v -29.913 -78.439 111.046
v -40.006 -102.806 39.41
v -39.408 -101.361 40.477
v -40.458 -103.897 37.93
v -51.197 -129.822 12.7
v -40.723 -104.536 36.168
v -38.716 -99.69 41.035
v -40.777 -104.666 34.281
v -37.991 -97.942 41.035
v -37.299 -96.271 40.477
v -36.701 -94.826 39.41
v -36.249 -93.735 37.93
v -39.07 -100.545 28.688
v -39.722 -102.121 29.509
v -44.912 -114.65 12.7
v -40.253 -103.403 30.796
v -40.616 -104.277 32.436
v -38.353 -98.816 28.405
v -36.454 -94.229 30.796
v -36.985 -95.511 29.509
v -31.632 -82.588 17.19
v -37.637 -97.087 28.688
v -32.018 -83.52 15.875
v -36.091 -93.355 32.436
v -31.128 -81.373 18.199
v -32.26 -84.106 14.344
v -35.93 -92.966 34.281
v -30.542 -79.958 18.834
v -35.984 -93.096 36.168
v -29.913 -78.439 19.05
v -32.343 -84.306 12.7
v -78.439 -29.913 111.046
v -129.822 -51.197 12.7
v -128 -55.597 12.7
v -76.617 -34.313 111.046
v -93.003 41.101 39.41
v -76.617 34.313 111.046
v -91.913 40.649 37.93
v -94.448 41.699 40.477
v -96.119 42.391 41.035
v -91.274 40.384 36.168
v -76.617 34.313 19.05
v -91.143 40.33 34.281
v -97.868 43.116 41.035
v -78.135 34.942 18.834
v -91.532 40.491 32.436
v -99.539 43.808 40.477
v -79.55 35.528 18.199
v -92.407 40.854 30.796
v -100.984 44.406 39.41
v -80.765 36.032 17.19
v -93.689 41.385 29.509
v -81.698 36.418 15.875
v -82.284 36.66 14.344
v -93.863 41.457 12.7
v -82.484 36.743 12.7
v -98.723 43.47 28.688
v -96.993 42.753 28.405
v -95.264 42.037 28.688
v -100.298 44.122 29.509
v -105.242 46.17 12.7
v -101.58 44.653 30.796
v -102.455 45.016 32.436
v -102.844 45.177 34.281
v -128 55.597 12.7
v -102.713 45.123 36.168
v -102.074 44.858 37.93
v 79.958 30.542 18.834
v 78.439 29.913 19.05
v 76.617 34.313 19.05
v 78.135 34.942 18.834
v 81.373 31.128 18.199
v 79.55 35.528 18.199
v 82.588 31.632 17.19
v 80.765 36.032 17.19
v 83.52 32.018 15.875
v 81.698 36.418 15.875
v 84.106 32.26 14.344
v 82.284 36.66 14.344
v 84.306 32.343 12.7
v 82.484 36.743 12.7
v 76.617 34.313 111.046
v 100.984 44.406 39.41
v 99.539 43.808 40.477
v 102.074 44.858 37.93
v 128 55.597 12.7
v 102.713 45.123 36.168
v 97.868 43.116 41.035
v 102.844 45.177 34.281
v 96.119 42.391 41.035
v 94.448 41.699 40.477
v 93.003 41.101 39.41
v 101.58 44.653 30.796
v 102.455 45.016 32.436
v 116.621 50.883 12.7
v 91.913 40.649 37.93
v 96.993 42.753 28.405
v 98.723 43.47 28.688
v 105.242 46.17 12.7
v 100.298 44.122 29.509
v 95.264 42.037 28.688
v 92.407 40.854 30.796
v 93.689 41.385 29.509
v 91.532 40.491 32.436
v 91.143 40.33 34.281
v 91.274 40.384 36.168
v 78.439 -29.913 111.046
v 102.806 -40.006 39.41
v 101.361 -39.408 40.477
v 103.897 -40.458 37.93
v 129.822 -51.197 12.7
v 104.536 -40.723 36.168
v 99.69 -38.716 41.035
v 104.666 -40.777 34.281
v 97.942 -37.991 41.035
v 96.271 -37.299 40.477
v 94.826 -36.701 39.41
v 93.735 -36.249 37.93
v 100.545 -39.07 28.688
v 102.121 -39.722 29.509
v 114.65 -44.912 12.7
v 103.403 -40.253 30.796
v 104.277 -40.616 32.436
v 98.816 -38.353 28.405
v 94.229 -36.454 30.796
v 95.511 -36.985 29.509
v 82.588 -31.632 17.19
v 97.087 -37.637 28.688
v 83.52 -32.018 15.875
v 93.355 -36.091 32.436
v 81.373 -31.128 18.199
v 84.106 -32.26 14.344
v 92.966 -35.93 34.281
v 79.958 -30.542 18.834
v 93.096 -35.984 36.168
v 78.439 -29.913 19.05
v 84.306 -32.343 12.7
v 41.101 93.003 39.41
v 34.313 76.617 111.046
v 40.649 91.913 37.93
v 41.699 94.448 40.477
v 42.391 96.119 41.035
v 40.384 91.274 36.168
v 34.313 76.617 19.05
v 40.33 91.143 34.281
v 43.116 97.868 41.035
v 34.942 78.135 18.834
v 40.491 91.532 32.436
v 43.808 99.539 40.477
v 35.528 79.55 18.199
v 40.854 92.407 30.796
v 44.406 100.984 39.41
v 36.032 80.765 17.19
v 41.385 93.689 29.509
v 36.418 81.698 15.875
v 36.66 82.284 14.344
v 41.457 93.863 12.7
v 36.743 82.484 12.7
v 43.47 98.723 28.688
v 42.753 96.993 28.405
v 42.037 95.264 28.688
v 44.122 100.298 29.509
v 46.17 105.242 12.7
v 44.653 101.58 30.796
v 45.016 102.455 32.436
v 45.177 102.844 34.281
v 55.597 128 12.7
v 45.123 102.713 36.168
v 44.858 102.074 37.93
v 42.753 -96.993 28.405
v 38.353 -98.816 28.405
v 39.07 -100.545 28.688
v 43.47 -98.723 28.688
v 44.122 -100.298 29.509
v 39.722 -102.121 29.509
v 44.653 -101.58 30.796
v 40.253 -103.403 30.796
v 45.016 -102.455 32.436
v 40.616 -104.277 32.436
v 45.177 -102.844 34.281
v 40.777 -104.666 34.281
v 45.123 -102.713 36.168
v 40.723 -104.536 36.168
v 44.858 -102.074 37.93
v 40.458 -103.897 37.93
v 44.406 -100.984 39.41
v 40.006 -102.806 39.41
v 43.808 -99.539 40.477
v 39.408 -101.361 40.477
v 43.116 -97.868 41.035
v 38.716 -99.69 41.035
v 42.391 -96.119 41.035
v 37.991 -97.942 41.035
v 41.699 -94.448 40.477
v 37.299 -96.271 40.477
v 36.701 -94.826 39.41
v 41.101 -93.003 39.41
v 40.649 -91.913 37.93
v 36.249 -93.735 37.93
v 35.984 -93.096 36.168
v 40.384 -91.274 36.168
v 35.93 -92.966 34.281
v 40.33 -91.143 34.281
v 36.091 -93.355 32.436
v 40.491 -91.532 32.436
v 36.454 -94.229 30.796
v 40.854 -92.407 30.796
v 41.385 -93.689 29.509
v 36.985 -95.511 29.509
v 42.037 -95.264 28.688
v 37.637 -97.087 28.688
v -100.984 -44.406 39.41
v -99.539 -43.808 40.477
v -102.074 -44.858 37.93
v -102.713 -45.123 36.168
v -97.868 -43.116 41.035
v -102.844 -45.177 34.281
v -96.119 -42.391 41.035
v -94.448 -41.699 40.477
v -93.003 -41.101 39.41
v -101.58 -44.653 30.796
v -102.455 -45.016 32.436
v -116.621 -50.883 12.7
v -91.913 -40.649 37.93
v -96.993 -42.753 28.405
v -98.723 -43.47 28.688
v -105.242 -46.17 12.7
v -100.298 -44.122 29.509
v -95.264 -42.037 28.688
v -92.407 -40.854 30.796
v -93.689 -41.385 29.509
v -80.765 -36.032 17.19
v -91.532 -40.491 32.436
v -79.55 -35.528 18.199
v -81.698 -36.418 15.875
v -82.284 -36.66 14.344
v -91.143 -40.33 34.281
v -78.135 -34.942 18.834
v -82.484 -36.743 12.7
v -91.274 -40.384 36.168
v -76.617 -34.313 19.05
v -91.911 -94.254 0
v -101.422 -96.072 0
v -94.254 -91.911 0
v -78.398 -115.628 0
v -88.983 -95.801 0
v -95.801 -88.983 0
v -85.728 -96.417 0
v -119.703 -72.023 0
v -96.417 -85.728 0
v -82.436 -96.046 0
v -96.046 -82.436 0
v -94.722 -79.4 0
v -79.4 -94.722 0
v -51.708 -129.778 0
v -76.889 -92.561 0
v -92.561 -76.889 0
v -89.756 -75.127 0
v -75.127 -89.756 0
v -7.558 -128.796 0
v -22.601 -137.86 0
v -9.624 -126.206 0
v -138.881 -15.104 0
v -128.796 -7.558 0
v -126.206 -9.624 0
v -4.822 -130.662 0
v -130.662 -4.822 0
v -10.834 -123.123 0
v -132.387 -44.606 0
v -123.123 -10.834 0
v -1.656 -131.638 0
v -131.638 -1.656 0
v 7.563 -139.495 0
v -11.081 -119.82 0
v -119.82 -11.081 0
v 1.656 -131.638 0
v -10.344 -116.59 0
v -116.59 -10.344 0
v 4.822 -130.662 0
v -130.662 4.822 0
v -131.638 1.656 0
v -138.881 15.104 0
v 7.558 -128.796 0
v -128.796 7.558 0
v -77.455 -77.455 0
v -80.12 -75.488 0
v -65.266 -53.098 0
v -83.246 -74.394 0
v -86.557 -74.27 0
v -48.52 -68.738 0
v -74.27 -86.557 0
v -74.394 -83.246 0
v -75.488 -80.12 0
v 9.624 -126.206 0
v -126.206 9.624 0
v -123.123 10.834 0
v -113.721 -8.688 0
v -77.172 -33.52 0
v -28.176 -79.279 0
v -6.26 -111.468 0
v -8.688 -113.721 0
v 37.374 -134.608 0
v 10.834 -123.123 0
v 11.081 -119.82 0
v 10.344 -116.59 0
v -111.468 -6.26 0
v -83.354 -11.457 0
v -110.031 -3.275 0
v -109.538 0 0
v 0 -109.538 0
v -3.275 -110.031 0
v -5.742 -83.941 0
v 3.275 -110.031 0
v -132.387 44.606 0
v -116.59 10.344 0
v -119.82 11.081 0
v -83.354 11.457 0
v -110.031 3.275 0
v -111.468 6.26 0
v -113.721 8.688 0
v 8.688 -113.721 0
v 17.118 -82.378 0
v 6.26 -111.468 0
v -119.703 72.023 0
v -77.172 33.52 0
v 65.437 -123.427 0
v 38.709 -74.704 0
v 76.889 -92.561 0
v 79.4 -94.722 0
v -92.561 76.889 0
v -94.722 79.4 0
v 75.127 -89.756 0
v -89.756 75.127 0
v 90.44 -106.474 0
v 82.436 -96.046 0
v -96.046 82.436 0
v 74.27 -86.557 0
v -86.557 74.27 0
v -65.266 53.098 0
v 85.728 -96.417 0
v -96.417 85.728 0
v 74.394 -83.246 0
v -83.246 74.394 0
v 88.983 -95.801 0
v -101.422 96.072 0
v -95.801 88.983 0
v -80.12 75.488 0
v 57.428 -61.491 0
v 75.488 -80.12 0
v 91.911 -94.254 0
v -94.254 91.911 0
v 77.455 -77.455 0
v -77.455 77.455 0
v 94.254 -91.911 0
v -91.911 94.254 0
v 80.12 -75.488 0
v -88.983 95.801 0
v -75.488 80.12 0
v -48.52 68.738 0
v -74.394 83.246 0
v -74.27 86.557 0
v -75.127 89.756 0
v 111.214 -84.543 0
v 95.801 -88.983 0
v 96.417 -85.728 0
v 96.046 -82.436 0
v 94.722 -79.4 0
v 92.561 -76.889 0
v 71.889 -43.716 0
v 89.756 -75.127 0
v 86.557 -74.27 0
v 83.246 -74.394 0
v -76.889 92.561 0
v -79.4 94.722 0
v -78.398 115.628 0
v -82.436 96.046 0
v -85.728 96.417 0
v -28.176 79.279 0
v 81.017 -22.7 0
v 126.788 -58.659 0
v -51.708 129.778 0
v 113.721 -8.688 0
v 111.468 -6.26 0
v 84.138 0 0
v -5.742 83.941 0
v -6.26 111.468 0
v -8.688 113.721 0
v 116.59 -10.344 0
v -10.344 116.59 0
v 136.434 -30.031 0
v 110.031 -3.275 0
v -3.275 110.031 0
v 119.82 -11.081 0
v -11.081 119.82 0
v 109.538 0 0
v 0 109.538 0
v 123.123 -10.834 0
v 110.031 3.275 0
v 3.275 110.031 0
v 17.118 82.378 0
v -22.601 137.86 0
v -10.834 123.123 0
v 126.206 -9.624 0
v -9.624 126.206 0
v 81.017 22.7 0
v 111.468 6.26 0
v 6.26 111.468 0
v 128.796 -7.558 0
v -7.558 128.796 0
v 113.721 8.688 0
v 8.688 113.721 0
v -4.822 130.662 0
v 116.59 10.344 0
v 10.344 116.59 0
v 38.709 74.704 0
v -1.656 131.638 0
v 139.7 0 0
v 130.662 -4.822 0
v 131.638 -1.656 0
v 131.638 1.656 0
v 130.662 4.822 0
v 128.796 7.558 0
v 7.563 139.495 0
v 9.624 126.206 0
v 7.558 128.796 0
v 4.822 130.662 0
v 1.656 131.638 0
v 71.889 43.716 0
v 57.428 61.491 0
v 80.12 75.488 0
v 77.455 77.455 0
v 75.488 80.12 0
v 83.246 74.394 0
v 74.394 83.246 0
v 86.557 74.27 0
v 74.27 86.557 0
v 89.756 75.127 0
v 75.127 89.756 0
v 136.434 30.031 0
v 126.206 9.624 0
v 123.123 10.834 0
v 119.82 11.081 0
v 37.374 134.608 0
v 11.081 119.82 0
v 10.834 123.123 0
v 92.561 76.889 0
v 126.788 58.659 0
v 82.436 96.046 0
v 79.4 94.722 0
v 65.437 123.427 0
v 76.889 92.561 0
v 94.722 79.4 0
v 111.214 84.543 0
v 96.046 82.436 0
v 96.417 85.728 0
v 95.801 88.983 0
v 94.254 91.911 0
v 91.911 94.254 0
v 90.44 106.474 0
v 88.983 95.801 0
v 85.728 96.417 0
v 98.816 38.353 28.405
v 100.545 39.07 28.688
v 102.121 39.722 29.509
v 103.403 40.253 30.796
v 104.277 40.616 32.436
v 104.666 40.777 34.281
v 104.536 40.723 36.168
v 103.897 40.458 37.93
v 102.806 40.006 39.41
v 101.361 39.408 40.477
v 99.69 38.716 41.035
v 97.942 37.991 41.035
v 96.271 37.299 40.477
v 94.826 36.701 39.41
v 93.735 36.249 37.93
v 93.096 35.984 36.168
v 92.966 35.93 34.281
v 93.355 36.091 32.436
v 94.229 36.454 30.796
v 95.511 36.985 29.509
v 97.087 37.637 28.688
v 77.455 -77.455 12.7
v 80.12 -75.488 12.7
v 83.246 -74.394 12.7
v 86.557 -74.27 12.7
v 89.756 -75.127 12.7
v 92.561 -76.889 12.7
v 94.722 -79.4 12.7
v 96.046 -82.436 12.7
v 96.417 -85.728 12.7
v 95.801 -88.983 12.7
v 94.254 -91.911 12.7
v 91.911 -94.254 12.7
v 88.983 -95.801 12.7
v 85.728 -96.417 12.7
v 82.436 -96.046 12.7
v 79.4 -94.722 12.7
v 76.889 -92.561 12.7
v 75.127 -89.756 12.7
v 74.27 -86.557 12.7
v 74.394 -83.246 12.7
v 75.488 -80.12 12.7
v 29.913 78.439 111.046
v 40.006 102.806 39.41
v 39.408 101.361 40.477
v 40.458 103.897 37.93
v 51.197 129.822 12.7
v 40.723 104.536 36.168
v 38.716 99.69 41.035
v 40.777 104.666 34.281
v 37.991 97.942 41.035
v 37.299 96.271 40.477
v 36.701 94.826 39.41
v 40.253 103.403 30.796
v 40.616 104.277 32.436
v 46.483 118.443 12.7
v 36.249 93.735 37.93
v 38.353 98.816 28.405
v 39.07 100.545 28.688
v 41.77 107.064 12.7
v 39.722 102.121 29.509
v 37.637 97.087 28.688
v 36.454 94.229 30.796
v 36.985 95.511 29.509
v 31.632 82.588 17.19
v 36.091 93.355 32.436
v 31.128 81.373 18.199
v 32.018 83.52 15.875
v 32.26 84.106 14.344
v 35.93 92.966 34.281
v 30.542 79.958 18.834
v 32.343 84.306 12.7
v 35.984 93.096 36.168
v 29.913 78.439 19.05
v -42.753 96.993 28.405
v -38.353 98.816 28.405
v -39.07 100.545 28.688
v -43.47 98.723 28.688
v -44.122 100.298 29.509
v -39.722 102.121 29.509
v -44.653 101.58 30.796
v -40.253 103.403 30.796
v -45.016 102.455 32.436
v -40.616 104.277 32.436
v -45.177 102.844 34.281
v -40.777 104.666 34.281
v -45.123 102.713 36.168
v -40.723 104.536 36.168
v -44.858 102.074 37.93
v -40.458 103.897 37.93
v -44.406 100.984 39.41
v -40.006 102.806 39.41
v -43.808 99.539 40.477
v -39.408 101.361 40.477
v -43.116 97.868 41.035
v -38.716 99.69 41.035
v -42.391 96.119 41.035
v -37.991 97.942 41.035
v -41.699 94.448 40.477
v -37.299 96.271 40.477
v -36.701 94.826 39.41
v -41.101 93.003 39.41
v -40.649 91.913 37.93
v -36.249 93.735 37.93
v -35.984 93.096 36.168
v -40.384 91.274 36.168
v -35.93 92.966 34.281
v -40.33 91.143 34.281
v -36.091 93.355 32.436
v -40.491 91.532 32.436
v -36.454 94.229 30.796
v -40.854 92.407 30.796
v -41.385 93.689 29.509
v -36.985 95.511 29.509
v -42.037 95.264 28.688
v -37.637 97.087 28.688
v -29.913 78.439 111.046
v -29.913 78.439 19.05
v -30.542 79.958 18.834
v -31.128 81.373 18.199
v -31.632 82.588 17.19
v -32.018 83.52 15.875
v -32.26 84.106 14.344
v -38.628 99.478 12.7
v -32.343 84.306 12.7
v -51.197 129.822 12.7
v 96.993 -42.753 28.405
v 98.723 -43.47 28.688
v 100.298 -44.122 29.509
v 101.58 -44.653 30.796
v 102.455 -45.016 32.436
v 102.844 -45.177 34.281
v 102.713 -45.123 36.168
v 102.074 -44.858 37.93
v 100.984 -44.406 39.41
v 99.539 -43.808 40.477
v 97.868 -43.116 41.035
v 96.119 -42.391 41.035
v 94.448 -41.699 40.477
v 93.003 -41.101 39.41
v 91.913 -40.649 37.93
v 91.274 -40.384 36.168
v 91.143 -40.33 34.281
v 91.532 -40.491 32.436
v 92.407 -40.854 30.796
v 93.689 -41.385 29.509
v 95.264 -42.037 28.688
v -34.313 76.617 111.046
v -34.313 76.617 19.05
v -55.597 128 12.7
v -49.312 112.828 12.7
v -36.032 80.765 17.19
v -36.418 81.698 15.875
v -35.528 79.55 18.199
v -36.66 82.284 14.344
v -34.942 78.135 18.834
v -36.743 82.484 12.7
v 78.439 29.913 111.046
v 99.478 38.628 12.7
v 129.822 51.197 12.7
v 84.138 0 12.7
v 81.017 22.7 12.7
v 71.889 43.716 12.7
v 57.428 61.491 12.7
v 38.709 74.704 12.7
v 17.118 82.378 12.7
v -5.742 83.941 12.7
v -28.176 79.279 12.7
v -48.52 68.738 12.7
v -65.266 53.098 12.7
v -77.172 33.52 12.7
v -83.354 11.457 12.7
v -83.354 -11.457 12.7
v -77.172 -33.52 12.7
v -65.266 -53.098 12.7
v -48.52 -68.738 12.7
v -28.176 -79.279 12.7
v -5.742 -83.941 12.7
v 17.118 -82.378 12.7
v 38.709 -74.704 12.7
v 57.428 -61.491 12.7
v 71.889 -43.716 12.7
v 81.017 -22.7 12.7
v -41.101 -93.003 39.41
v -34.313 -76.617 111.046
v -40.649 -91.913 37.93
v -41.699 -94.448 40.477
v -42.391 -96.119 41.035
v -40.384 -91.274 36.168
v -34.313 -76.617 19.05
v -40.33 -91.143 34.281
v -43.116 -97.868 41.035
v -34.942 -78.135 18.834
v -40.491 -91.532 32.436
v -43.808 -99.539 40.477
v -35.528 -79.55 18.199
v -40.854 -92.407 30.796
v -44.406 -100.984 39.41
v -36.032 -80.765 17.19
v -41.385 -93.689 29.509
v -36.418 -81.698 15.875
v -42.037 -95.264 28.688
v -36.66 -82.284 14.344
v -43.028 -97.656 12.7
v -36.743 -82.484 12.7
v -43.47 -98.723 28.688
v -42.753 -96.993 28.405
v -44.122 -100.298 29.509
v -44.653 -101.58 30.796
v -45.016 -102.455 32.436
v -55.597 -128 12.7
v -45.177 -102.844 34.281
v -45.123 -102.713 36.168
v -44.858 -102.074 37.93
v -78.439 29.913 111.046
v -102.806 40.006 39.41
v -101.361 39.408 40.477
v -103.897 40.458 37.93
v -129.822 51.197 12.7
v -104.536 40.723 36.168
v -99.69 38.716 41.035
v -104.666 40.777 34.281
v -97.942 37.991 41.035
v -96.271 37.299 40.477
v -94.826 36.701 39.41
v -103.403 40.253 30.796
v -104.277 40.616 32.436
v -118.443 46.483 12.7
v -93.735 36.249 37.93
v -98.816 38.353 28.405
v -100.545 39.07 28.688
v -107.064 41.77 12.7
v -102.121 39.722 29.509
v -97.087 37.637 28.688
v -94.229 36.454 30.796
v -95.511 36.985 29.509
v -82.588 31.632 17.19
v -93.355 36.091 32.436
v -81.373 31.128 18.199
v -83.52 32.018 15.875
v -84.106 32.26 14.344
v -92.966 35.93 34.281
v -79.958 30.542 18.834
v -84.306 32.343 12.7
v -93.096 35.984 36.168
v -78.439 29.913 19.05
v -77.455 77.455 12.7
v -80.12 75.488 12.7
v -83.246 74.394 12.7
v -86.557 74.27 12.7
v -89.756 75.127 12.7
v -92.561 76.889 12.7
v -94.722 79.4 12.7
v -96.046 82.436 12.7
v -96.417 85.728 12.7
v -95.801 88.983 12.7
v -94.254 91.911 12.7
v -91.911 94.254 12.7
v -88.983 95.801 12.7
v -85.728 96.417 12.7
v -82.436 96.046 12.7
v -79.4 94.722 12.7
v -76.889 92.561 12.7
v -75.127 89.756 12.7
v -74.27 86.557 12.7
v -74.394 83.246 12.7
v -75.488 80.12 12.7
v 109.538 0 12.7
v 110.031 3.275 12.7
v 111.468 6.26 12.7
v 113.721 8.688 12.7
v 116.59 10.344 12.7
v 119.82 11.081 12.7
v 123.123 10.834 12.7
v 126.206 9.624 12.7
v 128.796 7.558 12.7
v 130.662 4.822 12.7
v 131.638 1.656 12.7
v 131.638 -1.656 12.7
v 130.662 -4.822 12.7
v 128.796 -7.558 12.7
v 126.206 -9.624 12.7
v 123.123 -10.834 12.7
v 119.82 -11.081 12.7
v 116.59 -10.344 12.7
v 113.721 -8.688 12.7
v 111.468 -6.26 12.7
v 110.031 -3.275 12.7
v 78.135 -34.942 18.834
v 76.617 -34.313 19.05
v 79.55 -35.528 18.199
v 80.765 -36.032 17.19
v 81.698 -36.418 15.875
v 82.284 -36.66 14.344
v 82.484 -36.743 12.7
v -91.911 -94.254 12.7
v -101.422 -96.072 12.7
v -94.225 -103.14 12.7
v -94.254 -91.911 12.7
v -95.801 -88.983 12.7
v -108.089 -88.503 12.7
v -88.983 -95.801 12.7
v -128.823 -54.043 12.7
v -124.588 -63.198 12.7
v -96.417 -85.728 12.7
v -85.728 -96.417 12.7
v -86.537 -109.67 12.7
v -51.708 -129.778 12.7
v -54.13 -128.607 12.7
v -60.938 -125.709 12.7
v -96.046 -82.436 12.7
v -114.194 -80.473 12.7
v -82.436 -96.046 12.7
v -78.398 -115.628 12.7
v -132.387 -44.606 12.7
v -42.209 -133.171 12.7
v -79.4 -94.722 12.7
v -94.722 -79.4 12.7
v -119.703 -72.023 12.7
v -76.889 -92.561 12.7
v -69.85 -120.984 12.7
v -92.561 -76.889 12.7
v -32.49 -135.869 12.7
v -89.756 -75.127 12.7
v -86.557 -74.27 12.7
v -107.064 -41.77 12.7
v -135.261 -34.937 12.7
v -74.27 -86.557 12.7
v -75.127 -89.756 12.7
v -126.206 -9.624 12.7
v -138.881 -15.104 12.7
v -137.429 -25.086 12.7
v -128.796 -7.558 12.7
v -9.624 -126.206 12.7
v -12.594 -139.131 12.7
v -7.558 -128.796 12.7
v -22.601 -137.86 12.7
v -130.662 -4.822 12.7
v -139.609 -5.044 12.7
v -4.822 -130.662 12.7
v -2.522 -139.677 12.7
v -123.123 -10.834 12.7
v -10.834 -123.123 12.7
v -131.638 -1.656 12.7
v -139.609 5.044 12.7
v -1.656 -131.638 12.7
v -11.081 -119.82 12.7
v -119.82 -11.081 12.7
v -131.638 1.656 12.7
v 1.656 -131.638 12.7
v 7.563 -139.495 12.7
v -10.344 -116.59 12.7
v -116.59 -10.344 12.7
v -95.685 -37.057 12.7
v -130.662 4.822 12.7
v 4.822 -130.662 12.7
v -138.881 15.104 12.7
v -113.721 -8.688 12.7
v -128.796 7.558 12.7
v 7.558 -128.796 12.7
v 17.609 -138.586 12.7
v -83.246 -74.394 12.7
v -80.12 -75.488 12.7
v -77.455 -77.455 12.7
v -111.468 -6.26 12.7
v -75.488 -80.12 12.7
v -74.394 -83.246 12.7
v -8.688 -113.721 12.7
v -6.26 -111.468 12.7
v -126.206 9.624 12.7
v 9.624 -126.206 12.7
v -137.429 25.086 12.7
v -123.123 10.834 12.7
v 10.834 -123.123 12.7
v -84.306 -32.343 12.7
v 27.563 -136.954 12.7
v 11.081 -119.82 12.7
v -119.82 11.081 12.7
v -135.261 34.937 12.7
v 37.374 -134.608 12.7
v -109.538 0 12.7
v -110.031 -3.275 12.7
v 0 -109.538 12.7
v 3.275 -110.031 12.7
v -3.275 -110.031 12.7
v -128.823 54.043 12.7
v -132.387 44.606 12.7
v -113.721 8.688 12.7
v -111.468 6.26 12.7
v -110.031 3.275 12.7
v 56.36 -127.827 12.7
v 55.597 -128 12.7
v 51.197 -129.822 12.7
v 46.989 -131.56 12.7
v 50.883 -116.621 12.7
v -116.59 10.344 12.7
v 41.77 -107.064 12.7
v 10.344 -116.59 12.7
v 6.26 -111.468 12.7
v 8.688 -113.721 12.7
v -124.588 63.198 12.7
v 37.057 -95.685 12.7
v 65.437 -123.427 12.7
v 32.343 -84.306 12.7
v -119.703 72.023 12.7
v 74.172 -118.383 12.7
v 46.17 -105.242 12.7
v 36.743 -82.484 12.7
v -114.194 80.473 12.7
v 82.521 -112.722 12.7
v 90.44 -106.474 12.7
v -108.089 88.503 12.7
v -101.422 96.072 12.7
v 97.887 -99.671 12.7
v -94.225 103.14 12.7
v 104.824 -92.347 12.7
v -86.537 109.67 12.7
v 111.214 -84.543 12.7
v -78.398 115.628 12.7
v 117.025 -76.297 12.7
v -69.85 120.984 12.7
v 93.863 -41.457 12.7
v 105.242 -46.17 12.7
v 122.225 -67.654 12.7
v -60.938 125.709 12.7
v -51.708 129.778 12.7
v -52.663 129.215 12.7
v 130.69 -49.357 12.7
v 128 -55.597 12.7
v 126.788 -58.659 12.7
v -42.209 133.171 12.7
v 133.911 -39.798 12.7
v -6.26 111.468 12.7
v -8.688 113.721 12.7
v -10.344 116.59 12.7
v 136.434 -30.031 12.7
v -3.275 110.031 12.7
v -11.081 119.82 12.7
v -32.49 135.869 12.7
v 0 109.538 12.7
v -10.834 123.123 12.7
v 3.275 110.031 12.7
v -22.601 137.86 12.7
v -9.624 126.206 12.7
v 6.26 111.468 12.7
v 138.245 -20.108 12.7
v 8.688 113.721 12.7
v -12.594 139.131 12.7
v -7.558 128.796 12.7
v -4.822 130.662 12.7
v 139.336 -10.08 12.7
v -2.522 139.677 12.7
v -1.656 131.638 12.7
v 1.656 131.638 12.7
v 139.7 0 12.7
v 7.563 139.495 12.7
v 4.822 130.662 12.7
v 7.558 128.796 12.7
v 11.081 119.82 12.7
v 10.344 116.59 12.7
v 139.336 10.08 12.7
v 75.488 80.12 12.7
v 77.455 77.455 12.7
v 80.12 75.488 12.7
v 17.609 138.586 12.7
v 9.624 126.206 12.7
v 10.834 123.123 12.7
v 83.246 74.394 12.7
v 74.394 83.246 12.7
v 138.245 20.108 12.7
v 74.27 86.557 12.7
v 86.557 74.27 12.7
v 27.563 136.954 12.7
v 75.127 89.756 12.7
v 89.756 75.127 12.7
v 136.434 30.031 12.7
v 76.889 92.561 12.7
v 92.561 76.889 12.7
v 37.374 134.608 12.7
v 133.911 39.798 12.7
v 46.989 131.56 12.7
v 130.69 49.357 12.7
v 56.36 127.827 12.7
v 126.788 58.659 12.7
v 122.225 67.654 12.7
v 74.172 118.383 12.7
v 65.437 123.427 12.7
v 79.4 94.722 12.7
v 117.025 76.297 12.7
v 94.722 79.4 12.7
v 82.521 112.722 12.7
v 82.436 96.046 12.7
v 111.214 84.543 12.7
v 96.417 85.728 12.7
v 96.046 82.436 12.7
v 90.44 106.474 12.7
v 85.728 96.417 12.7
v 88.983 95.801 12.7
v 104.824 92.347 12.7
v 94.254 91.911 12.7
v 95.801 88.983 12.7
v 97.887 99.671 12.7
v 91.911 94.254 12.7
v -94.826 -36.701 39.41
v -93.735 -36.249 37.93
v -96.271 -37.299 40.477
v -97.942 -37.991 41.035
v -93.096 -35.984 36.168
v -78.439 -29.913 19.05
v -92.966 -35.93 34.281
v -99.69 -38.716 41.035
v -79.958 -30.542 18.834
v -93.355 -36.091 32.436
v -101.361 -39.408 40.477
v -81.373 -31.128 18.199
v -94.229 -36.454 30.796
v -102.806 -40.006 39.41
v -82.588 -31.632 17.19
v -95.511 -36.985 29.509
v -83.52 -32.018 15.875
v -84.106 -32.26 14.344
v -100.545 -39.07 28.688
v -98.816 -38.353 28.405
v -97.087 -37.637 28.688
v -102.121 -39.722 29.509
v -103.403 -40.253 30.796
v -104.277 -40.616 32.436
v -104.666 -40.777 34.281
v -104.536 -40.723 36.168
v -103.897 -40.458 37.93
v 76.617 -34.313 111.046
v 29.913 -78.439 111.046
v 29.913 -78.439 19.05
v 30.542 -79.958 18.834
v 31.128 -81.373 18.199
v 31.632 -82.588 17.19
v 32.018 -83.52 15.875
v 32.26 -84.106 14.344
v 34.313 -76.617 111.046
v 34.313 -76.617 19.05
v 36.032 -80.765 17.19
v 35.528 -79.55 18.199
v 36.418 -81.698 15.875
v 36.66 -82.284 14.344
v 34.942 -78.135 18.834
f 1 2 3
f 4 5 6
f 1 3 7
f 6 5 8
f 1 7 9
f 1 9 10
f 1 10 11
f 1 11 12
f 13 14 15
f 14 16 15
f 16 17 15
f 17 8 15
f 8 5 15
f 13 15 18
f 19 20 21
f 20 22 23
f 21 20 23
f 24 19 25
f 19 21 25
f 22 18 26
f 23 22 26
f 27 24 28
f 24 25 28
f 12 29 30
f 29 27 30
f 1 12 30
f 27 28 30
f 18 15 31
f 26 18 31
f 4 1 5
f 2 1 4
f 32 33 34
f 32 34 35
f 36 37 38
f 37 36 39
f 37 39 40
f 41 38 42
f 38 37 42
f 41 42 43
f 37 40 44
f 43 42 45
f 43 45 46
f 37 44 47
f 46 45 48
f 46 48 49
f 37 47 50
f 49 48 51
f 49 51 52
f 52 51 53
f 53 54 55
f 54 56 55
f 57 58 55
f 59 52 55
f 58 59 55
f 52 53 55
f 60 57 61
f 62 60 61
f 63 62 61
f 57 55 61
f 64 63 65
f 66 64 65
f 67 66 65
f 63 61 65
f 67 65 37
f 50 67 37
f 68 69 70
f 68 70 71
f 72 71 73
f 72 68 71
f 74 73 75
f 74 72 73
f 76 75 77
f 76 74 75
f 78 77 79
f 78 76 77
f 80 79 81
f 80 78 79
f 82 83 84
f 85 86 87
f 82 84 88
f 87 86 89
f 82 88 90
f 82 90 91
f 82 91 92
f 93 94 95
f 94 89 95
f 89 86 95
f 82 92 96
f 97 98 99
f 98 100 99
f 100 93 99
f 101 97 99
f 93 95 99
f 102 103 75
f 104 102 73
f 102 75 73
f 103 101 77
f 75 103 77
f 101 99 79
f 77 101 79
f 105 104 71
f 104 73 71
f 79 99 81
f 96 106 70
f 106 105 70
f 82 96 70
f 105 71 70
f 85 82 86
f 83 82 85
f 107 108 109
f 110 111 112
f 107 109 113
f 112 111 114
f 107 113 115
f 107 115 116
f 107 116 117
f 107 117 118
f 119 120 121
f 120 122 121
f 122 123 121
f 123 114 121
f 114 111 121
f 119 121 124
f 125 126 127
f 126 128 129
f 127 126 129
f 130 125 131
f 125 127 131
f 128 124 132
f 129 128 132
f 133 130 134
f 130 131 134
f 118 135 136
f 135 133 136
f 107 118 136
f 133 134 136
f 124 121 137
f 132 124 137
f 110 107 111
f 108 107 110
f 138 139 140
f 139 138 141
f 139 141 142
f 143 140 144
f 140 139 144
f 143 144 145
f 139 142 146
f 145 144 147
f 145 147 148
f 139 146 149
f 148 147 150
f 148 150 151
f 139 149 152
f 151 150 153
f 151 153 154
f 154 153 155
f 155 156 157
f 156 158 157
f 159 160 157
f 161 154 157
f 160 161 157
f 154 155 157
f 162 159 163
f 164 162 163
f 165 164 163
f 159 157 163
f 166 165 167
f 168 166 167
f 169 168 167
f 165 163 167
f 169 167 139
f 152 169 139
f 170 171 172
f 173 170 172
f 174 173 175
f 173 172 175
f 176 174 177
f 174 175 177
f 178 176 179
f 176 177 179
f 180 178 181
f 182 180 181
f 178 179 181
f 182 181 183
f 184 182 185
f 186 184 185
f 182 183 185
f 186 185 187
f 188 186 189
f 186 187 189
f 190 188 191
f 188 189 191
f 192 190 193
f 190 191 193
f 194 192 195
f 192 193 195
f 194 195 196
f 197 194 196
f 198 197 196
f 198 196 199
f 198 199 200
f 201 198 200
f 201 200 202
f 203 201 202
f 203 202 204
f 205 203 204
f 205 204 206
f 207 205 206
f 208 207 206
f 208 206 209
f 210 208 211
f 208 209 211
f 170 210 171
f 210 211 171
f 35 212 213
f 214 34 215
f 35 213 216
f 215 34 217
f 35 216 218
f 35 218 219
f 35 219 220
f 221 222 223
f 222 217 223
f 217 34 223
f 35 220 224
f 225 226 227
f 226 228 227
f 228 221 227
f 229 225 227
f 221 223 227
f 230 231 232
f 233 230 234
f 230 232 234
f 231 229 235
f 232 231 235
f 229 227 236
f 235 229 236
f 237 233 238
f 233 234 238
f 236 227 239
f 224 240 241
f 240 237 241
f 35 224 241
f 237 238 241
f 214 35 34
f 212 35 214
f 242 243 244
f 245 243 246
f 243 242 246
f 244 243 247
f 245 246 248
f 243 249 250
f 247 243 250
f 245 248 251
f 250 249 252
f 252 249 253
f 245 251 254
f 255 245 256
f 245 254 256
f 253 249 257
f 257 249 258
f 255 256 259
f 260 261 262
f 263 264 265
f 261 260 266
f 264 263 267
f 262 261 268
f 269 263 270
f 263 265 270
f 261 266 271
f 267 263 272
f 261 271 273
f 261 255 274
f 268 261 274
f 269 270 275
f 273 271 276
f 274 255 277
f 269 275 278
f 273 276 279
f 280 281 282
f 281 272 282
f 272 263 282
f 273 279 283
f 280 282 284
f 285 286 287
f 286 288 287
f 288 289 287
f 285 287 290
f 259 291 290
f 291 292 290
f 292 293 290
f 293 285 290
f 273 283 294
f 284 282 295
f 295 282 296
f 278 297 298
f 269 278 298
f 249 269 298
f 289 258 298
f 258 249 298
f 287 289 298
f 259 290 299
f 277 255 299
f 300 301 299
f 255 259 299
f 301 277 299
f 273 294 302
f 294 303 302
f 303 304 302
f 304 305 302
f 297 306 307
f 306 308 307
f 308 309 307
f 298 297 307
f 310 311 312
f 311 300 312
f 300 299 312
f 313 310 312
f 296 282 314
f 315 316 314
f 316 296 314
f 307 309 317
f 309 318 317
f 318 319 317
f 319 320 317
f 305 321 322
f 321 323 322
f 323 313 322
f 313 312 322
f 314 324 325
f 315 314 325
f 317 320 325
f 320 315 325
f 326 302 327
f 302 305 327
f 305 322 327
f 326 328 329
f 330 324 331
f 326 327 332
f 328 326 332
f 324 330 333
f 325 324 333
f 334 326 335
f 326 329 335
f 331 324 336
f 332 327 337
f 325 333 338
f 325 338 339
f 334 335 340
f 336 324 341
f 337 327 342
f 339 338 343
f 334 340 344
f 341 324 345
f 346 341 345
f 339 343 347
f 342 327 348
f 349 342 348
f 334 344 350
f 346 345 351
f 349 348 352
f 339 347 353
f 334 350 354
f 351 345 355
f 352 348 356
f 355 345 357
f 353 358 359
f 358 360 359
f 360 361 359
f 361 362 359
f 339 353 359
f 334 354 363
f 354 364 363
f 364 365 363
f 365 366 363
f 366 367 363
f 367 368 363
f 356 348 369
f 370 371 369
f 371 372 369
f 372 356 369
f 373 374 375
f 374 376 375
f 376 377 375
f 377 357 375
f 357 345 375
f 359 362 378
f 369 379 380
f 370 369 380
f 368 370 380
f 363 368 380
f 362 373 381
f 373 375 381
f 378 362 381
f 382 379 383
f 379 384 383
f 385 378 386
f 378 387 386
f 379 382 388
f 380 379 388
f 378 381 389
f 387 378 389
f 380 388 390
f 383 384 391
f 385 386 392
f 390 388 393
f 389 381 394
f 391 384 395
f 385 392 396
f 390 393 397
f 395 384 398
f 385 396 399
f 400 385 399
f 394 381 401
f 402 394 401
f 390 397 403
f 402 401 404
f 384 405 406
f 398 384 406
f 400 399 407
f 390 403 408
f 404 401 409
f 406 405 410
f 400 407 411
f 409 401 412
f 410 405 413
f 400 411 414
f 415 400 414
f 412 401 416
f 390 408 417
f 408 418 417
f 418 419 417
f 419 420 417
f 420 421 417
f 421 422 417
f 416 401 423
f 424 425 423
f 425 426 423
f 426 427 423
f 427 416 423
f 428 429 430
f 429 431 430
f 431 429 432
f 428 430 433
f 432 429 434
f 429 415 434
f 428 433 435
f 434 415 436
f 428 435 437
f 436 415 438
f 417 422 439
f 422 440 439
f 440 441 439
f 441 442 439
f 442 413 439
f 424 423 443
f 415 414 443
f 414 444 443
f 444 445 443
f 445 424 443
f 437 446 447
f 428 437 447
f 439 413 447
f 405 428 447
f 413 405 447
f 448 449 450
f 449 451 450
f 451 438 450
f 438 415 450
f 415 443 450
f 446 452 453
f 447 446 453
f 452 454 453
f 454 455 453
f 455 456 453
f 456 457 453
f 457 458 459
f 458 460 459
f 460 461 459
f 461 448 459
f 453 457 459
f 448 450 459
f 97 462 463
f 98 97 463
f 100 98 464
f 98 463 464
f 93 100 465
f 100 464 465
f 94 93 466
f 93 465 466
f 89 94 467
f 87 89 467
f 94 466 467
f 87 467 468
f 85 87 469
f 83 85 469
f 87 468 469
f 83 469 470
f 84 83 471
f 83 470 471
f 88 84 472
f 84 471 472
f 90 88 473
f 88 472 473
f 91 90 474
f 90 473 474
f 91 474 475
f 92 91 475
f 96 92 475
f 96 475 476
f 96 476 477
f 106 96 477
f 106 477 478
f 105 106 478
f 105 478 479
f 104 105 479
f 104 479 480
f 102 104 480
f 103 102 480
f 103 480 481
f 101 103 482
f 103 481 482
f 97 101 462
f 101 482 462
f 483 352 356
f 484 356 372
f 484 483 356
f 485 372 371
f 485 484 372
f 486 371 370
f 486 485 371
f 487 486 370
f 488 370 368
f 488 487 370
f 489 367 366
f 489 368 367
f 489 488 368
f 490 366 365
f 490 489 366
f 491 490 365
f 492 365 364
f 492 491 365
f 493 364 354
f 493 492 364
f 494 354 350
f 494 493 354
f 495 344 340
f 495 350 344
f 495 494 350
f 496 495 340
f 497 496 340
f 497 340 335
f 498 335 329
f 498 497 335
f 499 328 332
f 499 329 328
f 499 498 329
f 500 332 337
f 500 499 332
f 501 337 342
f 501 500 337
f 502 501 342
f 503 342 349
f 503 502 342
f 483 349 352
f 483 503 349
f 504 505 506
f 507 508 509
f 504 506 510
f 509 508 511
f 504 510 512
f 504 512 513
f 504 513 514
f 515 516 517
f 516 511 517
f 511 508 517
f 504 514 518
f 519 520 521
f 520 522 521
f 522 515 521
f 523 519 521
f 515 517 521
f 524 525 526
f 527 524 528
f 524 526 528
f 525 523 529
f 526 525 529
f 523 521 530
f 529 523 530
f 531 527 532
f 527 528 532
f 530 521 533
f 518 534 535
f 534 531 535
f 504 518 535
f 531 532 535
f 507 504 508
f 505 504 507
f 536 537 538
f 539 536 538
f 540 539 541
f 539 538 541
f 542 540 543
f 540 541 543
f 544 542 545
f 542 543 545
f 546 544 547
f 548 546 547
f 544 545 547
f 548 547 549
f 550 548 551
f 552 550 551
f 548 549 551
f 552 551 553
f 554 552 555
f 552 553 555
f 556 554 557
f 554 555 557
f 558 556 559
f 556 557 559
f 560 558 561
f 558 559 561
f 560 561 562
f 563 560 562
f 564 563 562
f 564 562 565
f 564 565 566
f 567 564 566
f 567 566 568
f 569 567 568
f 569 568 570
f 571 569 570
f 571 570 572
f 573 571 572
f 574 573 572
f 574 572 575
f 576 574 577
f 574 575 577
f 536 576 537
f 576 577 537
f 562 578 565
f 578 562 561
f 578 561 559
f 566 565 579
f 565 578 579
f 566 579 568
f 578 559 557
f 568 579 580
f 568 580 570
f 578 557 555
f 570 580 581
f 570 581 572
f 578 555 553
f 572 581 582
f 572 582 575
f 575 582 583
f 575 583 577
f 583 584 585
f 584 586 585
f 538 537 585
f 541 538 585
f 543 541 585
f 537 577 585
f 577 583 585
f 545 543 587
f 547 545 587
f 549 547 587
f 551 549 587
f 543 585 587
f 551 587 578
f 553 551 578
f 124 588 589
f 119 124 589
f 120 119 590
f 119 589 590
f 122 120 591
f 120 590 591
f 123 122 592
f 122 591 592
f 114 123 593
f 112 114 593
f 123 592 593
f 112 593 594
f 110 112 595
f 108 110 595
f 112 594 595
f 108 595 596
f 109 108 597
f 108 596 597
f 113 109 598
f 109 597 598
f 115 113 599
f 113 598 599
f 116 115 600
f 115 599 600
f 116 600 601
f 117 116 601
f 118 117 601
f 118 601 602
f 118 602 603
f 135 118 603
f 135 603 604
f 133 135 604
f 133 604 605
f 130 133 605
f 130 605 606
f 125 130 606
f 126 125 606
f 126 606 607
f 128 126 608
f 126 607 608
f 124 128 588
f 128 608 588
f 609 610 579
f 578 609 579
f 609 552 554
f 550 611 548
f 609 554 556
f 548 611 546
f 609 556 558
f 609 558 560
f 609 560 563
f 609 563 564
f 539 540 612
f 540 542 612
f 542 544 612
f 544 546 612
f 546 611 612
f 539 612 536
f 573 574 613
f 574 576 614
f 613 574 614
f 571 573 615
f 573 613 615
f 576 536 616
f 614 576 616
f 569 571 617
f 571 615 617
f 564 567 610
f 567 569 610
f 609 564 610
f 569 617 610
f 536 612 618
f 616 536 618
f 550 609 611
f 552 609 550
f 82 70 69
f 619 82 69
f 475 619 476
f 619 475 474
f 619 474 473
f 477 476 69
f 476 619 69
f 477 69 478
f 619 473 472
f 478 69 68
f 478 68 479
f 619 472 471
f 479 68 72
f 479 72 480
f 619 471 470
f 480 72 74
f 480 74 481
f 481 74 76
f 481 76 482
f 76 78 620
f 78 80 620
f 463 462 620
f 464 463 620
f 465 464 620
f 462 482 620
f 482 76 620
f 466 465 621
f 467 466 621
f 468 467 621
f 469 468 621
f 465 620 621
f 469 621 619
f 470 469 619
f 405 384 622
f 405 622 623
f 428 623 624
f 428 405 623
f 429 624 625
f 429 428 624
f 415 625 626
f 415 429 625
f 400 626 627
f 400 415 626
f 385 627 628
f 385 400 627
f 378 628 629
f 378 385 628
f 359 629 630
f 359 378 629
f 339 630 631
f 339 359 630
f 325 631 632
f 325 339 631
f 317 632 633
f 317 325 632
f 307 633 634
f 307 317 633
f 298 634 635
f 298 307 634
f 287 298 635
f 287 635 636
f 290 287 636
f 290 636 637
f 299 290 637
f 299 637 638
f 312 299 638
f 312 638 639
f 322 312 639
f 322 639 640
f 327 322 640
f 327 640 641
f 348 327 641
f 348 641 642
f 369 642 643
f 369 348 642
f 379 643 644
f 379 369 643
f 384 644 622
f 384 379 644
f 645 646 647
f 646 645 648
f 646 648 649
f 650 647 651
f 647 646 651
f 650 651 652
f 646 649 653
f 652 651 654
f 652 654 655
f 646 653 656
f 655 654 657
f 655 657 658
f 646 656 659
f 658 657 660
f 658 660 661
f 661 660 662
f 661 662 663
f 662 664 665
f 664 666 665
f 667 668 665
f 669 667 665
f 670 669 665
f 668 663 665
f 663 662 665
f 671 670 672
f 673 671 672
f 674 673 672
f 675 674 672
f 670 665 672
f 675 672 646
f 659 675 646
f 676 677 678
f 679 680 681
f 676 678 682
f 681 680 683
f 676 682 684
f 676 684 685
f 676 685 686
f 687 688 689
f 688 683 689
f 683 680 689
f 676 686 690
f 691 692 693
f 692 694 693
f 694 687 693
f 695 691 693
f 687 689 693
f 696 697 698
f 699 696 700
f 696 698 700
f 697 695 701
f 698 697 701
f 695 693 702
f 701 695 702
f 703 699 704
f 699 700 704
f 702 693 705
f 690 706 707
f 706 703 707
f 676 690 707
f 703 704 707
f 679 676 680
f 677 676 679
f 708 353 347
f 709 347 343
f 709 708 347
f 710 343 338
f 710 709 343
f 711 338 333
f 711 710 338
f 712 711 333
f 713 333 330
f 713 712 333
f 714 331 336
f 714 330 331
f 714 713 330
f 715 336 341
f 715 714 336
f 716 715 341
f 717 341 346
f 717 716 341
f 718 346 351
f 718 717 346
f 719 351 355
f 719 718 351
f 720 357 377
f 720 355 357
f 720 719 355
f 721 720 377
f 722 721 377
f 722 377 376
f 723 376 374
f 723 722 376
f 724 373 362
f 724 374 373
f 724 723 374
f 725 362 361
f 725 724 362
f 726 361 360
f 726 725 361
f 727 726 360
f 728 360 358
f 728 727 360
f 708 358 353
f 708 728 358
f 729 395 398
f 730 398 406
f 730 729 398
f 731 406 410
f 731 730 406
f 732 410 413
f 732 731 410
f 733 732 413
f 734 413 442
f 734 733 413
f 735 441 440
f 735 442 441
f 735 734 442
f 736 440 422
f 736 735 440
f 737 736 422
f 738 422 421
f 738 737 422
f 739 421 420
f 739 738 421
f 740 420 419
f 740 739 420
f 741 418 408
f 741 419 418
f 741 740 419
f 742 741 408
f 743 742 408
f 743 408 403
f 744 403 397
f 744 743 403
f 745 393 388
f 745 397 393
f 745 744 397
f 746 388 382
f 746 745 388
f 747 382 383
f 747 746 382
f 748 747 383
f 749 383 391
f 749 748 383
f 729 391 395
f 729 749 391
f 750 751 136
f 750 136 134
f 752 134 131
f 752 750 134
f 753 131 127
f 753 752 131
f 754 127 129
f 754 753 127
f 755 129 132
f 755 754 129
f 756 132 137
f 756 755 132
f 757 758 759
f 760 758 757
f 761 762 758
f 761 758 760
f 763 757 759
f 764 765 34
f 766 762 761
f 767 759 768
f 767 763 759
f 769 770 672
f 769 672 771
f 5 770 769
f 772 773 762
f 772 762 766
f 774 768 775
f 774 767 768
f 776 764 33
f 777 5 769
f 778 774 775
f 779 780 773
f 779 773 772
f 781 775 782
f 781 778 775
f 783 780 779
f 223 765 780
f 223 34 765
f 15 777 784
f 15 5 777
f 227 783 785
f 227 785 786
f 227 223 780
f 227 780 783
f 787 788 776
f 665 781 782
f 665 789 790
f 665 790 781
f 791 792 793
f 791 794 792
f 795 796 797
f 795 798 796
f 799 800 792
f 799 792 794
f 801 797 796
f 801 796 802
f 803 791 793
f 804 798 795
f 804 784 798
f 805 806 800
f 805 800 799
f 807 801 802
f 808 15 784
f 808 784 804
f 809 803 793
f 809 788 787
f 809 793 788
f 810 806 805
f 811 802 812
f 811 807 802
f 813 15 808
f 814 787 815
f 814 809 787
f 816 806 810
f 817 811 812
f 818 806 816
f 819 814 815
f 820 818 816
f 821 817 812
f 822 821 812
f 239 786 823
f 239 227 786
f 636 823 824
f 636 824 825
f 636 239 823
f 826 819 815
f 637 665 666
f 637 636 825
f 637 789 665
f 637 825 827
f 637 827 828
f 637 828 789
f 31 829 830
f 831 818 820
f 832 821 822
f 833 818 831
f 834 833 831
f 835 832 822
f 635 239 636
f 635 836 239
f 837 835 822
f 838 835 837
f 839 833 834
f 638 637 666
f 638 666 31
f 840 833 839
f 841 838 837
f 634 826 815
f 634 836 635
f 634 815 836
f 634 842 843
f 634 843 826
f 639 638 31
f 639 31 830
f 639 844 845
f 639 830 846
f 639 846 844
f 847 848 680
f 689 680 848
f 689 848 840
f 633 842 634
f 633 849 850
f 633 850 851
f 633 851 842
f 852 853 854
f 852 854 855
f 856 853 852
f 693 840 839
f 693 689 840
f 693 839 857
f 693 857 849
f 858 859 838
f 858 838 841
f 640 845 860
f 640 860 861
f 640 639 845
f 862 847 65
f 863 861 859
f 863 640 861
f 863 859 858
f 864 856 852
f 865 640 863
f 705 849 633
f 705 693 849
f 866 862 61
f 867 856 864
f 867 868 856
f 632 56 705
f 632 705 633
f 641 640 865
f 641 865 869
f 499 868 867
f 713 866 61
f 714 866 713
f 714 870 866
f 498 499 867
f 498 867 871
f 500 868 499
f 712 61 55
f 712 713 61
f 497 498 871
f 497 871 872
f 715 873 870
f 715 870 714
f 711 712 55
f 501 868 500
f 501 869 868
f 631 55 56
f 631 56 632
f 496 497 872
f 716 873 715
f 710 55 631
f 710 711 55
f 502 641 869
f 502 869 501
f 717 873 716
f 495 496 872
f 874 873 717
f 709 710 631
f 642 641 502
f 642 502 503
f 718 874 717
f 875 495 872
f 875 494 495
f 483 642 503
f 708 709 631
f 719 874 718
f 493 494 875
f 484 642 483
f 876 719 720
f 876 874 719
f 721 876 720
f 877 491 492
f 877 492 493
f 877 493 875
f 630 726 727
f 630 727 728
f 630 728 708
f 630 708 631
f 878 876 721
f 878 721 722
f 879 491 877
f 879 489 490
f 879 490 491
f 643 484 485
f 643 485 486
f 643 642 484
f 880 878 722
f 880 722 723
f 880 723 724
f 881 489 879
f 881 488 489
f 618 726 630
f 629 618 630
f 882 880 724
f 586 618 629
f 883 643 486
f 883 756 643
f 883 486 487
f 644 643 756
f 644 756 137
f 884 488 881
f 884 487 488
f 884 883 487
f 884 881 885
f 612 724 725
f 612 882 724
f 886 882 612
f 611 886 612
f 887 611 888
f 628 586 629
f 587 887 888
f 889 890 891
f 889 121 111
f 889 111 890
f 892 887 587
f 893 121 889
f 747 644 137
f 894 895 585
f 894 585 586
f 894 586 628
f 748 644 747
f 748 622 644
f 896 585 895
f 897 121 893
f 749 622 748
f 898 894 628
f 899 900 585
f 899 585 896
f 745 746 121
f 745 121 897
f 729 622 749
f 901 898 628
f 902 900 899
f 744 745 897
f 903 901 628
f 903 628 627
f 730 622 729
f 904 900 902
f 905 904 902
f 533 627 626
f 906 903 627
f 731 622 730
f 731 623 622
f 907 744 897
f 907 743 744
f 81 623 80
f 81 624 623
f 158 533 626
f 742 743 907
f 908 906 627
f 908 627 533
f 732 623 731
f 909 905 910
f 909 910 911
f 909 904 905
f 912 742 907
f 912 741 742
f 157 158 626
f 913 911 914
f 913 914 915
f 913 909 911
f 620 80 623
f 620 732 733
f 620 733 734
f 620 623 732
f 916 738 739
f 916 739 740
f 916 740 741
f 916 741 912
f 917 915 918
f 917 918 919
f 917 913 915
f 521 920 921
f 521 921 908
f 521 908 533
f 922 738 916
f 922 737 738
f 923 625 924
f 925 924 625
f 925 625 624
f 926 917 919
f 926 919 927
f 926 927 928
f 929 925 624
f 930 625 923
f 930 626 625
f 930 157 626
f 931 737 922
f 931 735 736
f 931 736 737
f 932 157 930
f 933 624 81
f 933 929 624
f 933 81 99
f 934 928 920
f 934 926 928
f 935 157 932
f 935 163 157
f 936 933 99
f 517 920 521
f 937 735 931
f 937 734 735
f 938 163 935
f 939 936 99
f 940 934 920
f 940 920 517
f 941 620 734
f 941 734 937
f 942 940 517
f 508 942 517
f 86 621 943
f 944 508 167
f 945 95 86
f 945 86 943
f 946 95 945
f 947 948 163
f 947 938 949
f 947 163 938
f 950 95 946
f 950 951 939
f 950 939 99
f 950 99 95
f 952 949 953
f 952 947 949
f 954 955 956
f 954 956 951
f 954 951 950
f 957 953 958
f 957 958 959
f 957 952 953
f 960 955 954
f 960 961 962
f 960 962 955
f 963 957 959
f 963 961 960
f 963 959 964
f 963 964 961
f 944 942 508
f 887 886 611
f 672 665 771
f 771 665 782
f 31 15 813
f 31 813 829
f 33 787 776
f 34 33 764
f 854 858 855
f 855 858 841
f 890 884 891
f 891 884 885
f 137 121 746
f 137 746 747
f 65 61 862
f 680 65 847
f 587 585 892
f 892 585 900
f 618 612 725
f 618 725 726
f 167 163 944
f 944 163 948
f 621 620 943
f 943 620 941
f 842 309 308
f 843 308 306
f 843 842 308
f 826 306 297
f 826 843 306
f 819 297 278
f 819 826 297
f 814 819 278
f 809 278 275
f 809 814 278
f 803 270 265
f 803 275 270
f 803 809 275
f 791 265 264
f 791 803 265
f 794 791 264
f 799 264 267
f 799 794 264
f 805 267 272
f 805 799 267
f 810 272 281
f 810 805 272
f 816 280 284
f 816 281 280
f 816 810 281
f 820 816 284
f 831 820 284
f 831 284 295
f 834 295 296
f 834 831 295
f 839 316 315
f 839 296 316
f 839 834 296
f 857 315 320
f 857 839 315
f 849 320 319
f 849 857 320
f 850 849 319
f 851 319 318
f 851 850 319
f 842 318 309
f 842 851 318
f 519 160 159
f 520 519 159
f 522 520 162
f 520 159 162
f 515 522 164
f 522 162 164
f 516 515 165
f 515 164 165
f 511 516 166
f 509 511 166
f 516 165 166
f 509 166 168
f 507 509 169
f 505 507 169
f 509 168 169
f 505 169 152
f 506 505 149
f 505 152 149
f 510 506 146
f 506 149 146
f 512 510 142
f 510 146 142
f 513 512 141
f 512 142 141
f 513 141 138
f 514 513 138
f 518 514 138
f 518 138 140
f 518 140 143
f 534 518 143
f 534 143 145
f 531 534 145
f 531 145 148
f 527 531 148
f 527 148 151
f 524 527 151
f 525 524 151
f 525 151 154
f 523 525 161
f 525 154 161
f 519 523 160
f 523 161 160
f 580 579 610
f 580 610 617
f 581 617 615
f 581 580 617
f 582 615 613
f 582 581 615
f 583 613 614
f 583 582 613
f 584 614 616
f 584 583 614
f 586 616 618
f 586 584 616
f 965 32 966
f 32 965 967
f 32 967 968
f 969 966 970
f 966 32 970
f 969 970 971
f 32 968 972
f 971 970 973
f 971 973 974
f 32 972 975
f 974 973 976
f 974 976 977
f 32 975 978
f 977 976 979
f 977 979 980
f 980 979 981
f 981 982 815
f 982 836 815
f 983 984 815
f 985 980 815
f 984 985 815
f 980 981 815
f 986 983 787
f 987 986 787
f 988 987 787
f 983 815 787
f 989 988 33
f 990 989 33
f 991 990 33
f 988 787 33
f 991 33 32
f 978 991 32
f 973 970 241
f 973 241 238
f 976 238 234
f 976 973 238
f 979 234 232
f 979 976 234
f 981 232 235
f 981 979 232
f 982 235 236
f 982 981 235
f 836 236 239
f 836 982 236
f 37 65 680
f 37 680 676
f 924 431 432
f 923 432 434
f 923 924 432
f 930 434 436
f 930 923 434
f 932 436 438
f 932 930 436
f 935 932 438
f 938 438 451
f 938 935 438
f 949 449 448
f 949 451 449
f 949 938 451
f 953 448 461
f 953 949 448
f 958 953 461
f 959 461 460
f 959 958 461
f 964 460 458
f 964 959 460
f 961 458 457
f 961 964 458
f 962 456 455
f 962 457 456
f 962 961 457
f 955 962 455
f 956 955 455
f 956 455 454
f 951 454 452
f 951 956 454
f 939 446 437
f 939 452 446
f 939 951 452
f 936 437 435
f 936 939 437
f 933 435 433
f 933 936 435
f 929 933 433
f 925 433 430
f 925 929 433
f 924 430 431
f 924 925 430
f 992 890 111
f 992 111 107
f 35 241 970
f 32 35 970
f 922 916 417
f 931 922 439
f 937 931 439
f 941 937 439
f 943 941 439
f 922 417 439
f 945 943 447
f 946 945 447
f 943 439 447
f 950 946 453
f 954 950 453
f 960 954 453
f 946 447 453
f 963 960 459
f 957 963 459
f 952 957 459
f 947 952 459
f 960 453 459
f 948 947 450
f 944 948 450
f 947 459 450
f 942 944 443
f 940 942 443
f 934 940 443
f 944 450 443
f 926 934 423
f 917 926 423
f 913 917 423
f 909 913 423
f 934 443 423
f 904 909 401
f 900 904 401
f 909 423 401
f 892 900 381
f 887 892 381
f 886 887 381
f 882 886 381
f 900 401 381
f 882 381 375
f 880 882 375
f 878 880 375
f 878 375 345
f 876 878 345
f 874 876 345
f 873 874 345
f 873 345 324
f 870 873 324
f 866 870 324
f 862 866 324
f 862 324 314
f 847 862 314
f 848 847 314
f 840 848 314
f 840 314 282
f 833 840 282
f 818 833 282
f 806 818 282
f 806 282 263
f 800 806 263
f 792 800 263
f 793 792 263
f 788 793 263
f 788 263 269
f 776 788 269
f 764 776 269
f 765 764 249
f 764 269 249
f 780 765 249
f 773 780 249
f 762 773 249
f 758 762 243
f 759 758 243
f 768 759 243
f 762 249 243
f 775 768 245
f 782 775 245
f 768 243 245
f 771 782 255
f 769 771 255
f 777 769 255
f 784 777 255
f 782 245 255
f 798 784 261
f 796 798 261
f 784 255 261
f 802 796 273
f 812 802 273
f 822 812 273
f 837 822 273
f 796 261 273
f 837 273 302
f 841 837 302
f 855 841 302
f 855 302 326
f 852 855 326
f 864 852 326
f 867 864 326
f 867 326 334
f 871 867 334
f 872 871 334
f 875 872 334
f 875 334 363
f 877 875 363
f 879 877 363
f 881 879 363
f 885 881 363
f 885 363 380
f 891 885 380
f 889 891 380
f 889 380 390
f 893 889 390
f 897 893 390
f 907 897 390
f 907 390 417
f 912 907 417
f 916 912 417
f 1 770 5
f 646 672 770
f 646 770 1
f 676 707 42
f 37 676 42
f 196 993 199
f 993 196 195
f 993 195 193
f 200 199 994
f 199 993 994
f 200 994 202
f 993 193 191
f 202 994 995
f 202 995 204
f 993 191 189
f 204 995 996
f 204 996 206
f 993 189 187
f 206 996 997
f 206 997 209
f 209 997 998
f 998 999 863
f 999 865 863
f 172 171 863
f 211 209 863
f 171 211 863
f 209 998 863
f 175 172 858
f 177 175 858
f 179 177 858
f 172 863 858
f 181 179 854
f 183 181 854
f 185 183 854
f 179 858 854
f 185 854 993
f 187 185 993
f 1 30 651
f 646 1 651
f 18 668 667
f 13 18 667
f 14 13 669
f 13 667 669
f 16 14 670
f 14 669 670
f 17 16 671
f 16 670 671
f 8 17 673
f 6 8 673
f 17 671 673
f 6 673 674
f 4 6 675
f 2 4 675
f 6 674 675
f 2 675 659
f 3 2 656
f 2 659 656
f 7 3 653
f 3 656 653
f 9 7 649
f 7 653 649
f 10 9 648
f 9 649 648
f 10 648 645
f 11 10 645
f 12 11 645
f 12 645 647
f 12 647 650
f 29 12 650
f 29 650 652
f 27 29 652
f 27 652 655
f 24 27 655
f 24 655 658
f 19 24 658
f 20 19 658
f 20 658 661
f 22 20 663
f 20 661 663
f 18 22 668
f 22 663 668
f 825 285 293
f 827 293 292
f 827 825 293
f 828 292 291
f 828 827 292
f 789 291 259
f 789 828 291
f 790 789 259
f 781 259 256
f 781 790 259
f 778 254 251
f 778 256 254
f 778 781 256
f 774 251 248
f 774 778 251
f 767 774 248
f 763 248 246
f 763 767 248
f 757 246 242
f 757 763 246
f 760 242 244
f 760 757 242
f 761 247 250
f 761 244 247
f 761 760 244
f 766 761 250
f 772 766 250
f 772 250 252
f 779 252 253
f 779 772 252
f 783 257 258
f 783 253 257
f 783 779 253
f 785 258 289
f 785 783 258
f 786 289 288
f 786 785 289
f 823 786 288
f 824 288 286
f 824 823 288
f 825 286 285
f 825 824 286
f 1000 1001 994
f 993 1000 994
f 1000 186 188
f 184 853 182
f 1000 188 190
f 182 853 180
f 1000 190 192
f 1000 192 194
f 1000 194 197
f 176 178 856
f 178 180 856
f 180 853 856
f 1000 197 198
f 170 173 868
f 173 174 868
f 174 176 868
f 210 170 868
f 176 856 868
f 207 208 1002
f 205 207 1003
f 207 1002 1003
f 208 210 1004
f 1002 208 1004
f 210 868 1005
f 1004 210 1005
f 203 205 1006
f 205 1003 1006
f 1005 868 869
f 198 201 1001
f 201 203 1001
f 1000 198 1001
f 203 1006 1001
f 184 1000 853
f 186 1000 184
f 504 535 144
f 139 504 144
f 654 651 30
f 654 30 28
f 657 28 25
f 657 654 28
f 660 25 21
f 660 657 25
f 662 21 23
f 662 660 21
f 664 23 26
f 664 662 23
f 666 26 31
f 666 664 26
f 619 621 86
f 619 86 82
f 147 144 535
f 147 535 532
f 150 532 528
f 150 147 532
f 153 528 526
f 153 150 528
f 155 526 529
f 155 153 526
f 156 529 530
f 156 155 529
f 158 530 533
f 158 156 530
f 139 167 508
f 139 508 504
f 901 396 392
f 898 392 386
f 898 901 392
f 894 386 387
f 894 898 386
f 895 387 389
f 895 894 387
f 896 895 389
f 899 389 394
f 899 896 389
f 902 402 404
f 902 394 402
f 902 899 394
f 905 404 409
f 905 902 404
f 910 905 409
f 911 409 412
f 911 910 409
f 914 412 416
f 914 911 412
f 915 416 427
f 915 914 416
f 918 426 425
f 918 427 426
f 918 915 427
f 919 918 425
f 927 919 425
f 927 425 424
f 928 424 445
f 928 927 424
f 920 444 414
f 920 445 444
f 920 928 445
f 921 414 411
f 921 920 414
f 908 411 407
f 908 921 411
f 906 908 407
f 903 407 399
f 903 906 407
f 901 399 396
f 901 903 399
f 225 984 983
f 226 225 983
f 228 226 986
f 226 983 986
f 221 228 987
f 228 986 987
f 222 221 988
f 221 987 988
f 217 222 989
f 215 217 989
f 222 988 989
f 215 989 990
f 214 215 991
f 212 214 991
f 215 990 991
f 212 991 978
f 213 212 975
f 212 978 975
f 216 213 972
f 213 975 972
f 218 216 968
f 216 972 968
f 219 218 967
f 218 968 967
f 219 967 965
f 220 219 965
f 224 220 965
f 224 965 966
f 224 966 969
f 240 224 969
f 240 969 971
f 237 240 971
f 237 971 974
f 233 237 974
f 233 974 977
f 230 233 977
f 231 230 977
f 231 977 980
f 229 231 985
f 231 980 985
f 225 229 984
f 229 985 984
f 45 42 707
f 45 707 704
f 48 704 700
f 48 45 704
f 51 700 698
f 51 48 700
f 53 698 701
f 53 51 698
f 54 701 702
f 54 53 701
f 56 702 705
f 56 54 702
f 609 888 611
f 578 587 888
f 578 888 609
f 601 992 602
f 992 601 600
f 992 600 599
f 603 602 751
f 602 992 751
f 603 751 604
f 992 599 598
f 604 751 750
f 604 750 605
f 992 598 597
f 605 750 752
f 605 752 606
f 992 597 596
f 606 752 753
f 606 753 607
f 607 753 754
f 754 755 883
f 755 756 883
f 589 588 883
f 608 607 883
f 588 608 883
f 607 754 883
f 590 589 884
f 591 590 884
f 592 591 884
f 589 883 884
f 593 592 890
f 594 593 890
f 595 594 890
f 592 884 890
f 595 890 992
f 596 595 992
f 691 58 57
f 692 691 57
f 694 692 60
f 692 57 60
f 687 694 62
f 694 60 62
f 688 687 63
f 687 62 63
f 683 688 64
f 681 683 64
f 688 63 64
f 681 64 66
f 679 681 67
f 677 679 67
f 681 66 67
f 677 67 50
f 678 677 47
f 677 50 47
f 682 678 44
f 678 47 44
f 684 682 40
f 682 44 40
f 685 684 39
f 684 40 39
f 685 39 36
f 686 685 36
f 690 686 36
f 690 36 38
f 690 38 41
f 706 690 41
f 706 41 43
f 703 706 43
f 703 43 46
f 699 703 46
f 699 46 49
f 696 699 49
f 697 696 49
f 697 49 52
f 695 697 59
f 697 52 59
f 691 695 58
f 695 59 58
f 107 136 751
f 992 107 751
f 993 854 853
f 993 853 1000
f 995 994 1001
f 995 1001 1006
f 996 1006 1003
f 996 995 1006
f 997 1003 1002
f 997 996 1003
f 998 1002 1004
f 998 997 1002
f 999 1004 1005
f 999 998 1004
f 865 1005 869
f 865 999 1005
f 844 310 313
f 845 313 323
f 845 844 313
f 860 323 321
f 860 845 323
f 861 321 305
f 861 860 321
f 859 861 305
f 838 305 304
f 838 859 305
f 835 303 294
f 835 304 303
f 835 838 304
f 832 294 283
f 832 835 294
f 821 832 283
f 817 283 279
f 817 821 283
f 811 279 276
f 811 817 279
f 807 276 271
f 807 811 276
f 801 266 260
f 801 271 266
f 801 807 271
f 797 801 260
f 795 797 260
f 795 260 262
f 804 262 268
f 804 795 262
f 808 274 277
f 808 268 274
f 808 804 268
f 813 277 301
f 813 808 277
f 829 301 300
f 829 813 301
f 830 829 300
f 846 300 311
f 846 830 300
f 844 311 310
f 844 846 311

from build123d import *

# Parameters (mm, degrees)
SKETCH1_R         = 139.7
SKETCH1_R_2       = 84.1375
EXTRUDE1_DEPTH    = 12.7
CIRPATTERN2_COUNT = 8
EXTRUDE4_DEPTH    = 98.345625
SKETCH8_R         = 6.35
EXTRUDE5_DEPTH    = 4.7625
CIRPATTERN4_COUNT = 8


with BuildPart() as part:
    # Sketch1 → Extrude1 (new body)
    with BuildSketch(Plane.XY):
        Circle(SKETCH1_R)
        Circle(SKETCH1_R_2, mode=Mode.SUBTRACT)
    extrude(amount=EXTRUDE1_DEPTH)

    # Sketch2 → 0.625_ Diameter Hole1 (revolve, cut)
    with BuildSketch(Plane(origin=(0, 120.65, 12.7), x_dir=(0, -1, 0), z_dir=(1, 0, 0))):
        Polygon((0, 0), (0, 32.077063629), (11.1125, 25.4), (11.1125, 0), align=None)
    f_0_625_diameter_hole1 = revolve(axis=Axis((0, 120.65, 19.05), (0, 0, -1)), mode=Mode.SUBTRACT)

    # CirPattern2: 0.625_ Diameter Hole1 ×8 about axis
    cirpattern2_axis = Axis((0, 0, 0), (0, 0, 1))
    for i in range(1, CIRPATTERN2_COUNT):
        add(f_0_625_diameter_hole1.rotate(cirpattern2_axis, i * 360 / CIRPATTERN2_COUNT), mode=Mode.SUBTRACT)

    # Sketch6 → Extrude4 (add)
    with BuildSketch(Plane.XY.offset(12.7)):
        Polygon((-55.596678696, 127.999749611), (-34.313207501, 76.616904797), (-29.913231227, 78.439434644), (-51.196702422, 129.822279457), align=None)
    extrude4 = extrude(amount=EXTRUDE4_DEPTH)

    # Sketch8 → Extrude5 (cut)
    with BuildSketch(Plane(origin=(2.199988137, 0.911264923, 0), x_dir=(0, 0, -1), z_dir=(0.923879533, 0.382683432, 0))):
        with Locations((-34.755447715, 105.971333923)):
            Circle(SKETCH8_R)
        Polygon((-12.7, 139.532276663), (-111.045625, 83.915886208), (-111.045625, 139.532276663), align=None)
        with BuildLine():
            Line((-12.7, 90.265886208), (-12.7, 83.915886208))
            Line((-12.7, 83.915886208), (-19.05, 83.915886208))
            ThreePointArc((-19.05, 83.915886208), (-17.190128061, 88.406014269), (-12.7, 90.265886208))
        make_face()
    extrude5 = extrude(amount=-EXTRUDE5_DEPTH, mode=Mode.SUBTRACT)

    # CirPattern4: Extrude4, Extrude5 ×8 about axis
    cirpattern4_axis = Axis((0, 0, 0), (0, 0, 1))
    for i in range(1, CIRPATTERN4_COUNT):
        add(extrude4.rotate(cirpattern4_axis, i * 360 / CIRPATTERN4_COUNT))
        add(extrude5.rotate(cirpattern4_axis, i * 360 / CIRPATTERN4_COUNT), mode=Mode.SUBTRACT)


solid = part.part
